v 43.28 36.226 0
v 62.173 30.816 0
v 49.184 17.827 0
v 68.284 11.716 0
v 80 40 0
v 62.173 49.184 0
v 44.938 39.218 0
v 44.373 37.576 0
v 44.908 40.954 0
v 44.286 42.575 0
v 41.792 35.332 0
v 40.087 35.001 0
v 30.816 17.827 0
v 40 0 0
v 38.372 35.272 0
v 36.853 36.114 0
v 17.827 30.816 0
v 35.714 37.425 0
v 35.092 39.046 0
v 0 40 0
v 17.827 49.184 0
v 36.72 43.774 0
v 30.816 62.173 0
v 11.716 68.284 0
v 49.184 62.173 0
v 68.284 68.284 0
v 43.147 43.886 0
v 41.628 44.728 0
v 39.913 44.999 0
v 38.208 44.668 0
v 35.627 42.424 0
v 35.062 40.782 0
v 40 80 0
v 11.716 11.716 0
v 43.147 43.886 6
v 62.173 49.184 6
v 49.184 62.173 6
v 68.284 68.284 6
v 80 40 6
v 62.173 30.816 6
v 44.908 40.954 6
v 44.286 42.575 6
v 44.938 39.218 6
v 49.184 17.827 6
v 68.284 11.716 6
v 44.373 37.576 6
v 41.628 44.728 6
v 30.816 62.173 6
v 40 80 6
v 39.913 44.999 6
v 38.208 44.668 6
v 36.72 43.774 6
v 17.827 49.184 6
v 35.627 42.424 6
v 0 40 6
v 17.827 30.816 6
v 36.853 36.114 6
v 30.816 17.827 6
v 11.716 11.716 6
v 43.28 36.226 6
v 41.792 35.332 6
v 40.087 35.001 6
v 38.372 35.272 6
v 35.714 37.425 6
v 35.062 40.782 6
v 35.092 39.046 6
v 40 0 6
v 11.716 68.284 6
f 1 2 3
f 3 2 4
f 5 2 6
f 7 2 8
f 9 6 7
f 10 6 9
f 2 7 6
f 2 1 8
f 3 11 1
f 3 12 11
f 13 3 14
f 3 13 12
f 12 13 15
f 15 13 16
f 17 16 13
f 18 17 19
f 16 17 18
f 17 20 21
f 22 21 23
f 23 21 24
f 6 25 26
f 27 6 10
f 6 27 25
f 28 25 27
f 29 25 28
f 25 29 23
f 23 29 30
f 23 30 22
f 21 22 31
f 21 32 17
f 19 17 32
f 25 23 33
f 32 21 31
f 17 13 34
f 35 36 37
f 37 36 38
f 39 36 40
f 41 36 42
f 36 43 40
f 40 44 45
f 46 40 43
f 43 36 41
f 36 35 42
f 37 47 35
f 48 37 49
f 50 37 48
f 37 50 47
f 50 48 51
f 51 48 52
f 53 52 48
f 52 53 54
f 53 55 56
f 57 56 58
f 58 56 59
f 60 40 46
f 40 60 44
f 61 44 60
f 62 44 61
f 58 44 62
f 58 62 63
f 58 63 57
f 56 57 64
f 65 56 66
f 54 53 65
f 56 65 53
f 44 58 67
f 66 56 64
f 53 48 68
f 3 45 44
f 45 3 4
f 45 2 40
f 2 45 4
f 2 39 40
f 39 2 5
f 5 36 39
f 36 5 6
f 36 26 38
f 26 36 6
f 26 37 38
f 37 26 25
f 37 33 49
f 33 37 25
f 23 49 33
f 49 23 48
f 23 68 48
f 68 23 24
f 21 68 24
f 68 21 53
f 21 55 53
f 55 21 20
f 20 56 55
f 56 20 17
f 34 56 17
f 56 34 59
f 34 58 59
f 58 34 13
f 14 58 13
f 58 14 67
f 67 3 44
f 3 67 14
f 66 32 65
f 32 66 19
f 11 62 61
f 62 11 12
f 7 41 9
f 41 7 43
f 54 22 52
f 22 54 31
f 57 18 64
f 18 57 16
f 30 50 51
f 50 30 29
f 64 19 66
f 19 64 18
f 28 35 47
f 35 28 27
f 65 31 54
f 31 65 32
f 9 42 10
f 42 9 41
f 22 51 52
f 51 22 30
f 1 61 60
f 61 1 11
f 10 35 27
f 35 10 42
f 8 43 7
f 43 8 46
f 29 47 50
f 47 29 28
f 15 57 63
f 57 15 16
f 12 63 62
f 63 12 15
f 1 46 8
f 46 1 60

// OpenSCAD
$fn = 32;
// target_bbox: 80, 80, 6
// ----------------------------------------------------------------------
// Star wheel: 8-point blunt, R40
// ----------------------------------------------------------------------

// --- parameters (mm) ---
n_points = 8;             // number of points / teeth
r_out = 40;               // tip radius
r_in = 24;                // root radius
bore_r = 5;               // centre bore radius
plate_t = 6;              // plate thickness, Z (extrusion height)
bore_d = 10;              // centre bore diameter

profile = [[40, 80], [30.816, 62.173], [11.716, 68.284], [17.827, 49.184], [0, 40], [17.827, 30.816], [11.716, 11.716], [30.816, 17.827], [40, 0], [49.184, 17.827], [68.284, 11.716], [62.173, 30.816], [80, 40], [62.173, 49.184], [68.284, 68.284], [49.184, 62.173]];  // primary outline, 16 points, counter clockwise
void_1 = [[44.908, 40.954], [44.286, 42.575], [43.147, 43.886], [41.628, 44.728], [39.913, 44.999], [38.208, 44.668], [36.72, 43.774], [35.627, 42.424], [35.062, 40.782], [35.092, 39.046], [35.714, 37.425], [36.853, 36.114], [38.372, 35.272], [40.087, 35.001], [41.792, 35.332], [43.28, 36.226], [44.373, 37.576], [44.938, 39.218]];  // centre bore, 18 points

// --- the one profile operation ---
difference() {
  linear_extrude(height = plate_t) polygon(points = profile);
  translate([0, 0, -1])
    linear_extrude(height = plate_t + 2) polygon(points = void_1);
}
